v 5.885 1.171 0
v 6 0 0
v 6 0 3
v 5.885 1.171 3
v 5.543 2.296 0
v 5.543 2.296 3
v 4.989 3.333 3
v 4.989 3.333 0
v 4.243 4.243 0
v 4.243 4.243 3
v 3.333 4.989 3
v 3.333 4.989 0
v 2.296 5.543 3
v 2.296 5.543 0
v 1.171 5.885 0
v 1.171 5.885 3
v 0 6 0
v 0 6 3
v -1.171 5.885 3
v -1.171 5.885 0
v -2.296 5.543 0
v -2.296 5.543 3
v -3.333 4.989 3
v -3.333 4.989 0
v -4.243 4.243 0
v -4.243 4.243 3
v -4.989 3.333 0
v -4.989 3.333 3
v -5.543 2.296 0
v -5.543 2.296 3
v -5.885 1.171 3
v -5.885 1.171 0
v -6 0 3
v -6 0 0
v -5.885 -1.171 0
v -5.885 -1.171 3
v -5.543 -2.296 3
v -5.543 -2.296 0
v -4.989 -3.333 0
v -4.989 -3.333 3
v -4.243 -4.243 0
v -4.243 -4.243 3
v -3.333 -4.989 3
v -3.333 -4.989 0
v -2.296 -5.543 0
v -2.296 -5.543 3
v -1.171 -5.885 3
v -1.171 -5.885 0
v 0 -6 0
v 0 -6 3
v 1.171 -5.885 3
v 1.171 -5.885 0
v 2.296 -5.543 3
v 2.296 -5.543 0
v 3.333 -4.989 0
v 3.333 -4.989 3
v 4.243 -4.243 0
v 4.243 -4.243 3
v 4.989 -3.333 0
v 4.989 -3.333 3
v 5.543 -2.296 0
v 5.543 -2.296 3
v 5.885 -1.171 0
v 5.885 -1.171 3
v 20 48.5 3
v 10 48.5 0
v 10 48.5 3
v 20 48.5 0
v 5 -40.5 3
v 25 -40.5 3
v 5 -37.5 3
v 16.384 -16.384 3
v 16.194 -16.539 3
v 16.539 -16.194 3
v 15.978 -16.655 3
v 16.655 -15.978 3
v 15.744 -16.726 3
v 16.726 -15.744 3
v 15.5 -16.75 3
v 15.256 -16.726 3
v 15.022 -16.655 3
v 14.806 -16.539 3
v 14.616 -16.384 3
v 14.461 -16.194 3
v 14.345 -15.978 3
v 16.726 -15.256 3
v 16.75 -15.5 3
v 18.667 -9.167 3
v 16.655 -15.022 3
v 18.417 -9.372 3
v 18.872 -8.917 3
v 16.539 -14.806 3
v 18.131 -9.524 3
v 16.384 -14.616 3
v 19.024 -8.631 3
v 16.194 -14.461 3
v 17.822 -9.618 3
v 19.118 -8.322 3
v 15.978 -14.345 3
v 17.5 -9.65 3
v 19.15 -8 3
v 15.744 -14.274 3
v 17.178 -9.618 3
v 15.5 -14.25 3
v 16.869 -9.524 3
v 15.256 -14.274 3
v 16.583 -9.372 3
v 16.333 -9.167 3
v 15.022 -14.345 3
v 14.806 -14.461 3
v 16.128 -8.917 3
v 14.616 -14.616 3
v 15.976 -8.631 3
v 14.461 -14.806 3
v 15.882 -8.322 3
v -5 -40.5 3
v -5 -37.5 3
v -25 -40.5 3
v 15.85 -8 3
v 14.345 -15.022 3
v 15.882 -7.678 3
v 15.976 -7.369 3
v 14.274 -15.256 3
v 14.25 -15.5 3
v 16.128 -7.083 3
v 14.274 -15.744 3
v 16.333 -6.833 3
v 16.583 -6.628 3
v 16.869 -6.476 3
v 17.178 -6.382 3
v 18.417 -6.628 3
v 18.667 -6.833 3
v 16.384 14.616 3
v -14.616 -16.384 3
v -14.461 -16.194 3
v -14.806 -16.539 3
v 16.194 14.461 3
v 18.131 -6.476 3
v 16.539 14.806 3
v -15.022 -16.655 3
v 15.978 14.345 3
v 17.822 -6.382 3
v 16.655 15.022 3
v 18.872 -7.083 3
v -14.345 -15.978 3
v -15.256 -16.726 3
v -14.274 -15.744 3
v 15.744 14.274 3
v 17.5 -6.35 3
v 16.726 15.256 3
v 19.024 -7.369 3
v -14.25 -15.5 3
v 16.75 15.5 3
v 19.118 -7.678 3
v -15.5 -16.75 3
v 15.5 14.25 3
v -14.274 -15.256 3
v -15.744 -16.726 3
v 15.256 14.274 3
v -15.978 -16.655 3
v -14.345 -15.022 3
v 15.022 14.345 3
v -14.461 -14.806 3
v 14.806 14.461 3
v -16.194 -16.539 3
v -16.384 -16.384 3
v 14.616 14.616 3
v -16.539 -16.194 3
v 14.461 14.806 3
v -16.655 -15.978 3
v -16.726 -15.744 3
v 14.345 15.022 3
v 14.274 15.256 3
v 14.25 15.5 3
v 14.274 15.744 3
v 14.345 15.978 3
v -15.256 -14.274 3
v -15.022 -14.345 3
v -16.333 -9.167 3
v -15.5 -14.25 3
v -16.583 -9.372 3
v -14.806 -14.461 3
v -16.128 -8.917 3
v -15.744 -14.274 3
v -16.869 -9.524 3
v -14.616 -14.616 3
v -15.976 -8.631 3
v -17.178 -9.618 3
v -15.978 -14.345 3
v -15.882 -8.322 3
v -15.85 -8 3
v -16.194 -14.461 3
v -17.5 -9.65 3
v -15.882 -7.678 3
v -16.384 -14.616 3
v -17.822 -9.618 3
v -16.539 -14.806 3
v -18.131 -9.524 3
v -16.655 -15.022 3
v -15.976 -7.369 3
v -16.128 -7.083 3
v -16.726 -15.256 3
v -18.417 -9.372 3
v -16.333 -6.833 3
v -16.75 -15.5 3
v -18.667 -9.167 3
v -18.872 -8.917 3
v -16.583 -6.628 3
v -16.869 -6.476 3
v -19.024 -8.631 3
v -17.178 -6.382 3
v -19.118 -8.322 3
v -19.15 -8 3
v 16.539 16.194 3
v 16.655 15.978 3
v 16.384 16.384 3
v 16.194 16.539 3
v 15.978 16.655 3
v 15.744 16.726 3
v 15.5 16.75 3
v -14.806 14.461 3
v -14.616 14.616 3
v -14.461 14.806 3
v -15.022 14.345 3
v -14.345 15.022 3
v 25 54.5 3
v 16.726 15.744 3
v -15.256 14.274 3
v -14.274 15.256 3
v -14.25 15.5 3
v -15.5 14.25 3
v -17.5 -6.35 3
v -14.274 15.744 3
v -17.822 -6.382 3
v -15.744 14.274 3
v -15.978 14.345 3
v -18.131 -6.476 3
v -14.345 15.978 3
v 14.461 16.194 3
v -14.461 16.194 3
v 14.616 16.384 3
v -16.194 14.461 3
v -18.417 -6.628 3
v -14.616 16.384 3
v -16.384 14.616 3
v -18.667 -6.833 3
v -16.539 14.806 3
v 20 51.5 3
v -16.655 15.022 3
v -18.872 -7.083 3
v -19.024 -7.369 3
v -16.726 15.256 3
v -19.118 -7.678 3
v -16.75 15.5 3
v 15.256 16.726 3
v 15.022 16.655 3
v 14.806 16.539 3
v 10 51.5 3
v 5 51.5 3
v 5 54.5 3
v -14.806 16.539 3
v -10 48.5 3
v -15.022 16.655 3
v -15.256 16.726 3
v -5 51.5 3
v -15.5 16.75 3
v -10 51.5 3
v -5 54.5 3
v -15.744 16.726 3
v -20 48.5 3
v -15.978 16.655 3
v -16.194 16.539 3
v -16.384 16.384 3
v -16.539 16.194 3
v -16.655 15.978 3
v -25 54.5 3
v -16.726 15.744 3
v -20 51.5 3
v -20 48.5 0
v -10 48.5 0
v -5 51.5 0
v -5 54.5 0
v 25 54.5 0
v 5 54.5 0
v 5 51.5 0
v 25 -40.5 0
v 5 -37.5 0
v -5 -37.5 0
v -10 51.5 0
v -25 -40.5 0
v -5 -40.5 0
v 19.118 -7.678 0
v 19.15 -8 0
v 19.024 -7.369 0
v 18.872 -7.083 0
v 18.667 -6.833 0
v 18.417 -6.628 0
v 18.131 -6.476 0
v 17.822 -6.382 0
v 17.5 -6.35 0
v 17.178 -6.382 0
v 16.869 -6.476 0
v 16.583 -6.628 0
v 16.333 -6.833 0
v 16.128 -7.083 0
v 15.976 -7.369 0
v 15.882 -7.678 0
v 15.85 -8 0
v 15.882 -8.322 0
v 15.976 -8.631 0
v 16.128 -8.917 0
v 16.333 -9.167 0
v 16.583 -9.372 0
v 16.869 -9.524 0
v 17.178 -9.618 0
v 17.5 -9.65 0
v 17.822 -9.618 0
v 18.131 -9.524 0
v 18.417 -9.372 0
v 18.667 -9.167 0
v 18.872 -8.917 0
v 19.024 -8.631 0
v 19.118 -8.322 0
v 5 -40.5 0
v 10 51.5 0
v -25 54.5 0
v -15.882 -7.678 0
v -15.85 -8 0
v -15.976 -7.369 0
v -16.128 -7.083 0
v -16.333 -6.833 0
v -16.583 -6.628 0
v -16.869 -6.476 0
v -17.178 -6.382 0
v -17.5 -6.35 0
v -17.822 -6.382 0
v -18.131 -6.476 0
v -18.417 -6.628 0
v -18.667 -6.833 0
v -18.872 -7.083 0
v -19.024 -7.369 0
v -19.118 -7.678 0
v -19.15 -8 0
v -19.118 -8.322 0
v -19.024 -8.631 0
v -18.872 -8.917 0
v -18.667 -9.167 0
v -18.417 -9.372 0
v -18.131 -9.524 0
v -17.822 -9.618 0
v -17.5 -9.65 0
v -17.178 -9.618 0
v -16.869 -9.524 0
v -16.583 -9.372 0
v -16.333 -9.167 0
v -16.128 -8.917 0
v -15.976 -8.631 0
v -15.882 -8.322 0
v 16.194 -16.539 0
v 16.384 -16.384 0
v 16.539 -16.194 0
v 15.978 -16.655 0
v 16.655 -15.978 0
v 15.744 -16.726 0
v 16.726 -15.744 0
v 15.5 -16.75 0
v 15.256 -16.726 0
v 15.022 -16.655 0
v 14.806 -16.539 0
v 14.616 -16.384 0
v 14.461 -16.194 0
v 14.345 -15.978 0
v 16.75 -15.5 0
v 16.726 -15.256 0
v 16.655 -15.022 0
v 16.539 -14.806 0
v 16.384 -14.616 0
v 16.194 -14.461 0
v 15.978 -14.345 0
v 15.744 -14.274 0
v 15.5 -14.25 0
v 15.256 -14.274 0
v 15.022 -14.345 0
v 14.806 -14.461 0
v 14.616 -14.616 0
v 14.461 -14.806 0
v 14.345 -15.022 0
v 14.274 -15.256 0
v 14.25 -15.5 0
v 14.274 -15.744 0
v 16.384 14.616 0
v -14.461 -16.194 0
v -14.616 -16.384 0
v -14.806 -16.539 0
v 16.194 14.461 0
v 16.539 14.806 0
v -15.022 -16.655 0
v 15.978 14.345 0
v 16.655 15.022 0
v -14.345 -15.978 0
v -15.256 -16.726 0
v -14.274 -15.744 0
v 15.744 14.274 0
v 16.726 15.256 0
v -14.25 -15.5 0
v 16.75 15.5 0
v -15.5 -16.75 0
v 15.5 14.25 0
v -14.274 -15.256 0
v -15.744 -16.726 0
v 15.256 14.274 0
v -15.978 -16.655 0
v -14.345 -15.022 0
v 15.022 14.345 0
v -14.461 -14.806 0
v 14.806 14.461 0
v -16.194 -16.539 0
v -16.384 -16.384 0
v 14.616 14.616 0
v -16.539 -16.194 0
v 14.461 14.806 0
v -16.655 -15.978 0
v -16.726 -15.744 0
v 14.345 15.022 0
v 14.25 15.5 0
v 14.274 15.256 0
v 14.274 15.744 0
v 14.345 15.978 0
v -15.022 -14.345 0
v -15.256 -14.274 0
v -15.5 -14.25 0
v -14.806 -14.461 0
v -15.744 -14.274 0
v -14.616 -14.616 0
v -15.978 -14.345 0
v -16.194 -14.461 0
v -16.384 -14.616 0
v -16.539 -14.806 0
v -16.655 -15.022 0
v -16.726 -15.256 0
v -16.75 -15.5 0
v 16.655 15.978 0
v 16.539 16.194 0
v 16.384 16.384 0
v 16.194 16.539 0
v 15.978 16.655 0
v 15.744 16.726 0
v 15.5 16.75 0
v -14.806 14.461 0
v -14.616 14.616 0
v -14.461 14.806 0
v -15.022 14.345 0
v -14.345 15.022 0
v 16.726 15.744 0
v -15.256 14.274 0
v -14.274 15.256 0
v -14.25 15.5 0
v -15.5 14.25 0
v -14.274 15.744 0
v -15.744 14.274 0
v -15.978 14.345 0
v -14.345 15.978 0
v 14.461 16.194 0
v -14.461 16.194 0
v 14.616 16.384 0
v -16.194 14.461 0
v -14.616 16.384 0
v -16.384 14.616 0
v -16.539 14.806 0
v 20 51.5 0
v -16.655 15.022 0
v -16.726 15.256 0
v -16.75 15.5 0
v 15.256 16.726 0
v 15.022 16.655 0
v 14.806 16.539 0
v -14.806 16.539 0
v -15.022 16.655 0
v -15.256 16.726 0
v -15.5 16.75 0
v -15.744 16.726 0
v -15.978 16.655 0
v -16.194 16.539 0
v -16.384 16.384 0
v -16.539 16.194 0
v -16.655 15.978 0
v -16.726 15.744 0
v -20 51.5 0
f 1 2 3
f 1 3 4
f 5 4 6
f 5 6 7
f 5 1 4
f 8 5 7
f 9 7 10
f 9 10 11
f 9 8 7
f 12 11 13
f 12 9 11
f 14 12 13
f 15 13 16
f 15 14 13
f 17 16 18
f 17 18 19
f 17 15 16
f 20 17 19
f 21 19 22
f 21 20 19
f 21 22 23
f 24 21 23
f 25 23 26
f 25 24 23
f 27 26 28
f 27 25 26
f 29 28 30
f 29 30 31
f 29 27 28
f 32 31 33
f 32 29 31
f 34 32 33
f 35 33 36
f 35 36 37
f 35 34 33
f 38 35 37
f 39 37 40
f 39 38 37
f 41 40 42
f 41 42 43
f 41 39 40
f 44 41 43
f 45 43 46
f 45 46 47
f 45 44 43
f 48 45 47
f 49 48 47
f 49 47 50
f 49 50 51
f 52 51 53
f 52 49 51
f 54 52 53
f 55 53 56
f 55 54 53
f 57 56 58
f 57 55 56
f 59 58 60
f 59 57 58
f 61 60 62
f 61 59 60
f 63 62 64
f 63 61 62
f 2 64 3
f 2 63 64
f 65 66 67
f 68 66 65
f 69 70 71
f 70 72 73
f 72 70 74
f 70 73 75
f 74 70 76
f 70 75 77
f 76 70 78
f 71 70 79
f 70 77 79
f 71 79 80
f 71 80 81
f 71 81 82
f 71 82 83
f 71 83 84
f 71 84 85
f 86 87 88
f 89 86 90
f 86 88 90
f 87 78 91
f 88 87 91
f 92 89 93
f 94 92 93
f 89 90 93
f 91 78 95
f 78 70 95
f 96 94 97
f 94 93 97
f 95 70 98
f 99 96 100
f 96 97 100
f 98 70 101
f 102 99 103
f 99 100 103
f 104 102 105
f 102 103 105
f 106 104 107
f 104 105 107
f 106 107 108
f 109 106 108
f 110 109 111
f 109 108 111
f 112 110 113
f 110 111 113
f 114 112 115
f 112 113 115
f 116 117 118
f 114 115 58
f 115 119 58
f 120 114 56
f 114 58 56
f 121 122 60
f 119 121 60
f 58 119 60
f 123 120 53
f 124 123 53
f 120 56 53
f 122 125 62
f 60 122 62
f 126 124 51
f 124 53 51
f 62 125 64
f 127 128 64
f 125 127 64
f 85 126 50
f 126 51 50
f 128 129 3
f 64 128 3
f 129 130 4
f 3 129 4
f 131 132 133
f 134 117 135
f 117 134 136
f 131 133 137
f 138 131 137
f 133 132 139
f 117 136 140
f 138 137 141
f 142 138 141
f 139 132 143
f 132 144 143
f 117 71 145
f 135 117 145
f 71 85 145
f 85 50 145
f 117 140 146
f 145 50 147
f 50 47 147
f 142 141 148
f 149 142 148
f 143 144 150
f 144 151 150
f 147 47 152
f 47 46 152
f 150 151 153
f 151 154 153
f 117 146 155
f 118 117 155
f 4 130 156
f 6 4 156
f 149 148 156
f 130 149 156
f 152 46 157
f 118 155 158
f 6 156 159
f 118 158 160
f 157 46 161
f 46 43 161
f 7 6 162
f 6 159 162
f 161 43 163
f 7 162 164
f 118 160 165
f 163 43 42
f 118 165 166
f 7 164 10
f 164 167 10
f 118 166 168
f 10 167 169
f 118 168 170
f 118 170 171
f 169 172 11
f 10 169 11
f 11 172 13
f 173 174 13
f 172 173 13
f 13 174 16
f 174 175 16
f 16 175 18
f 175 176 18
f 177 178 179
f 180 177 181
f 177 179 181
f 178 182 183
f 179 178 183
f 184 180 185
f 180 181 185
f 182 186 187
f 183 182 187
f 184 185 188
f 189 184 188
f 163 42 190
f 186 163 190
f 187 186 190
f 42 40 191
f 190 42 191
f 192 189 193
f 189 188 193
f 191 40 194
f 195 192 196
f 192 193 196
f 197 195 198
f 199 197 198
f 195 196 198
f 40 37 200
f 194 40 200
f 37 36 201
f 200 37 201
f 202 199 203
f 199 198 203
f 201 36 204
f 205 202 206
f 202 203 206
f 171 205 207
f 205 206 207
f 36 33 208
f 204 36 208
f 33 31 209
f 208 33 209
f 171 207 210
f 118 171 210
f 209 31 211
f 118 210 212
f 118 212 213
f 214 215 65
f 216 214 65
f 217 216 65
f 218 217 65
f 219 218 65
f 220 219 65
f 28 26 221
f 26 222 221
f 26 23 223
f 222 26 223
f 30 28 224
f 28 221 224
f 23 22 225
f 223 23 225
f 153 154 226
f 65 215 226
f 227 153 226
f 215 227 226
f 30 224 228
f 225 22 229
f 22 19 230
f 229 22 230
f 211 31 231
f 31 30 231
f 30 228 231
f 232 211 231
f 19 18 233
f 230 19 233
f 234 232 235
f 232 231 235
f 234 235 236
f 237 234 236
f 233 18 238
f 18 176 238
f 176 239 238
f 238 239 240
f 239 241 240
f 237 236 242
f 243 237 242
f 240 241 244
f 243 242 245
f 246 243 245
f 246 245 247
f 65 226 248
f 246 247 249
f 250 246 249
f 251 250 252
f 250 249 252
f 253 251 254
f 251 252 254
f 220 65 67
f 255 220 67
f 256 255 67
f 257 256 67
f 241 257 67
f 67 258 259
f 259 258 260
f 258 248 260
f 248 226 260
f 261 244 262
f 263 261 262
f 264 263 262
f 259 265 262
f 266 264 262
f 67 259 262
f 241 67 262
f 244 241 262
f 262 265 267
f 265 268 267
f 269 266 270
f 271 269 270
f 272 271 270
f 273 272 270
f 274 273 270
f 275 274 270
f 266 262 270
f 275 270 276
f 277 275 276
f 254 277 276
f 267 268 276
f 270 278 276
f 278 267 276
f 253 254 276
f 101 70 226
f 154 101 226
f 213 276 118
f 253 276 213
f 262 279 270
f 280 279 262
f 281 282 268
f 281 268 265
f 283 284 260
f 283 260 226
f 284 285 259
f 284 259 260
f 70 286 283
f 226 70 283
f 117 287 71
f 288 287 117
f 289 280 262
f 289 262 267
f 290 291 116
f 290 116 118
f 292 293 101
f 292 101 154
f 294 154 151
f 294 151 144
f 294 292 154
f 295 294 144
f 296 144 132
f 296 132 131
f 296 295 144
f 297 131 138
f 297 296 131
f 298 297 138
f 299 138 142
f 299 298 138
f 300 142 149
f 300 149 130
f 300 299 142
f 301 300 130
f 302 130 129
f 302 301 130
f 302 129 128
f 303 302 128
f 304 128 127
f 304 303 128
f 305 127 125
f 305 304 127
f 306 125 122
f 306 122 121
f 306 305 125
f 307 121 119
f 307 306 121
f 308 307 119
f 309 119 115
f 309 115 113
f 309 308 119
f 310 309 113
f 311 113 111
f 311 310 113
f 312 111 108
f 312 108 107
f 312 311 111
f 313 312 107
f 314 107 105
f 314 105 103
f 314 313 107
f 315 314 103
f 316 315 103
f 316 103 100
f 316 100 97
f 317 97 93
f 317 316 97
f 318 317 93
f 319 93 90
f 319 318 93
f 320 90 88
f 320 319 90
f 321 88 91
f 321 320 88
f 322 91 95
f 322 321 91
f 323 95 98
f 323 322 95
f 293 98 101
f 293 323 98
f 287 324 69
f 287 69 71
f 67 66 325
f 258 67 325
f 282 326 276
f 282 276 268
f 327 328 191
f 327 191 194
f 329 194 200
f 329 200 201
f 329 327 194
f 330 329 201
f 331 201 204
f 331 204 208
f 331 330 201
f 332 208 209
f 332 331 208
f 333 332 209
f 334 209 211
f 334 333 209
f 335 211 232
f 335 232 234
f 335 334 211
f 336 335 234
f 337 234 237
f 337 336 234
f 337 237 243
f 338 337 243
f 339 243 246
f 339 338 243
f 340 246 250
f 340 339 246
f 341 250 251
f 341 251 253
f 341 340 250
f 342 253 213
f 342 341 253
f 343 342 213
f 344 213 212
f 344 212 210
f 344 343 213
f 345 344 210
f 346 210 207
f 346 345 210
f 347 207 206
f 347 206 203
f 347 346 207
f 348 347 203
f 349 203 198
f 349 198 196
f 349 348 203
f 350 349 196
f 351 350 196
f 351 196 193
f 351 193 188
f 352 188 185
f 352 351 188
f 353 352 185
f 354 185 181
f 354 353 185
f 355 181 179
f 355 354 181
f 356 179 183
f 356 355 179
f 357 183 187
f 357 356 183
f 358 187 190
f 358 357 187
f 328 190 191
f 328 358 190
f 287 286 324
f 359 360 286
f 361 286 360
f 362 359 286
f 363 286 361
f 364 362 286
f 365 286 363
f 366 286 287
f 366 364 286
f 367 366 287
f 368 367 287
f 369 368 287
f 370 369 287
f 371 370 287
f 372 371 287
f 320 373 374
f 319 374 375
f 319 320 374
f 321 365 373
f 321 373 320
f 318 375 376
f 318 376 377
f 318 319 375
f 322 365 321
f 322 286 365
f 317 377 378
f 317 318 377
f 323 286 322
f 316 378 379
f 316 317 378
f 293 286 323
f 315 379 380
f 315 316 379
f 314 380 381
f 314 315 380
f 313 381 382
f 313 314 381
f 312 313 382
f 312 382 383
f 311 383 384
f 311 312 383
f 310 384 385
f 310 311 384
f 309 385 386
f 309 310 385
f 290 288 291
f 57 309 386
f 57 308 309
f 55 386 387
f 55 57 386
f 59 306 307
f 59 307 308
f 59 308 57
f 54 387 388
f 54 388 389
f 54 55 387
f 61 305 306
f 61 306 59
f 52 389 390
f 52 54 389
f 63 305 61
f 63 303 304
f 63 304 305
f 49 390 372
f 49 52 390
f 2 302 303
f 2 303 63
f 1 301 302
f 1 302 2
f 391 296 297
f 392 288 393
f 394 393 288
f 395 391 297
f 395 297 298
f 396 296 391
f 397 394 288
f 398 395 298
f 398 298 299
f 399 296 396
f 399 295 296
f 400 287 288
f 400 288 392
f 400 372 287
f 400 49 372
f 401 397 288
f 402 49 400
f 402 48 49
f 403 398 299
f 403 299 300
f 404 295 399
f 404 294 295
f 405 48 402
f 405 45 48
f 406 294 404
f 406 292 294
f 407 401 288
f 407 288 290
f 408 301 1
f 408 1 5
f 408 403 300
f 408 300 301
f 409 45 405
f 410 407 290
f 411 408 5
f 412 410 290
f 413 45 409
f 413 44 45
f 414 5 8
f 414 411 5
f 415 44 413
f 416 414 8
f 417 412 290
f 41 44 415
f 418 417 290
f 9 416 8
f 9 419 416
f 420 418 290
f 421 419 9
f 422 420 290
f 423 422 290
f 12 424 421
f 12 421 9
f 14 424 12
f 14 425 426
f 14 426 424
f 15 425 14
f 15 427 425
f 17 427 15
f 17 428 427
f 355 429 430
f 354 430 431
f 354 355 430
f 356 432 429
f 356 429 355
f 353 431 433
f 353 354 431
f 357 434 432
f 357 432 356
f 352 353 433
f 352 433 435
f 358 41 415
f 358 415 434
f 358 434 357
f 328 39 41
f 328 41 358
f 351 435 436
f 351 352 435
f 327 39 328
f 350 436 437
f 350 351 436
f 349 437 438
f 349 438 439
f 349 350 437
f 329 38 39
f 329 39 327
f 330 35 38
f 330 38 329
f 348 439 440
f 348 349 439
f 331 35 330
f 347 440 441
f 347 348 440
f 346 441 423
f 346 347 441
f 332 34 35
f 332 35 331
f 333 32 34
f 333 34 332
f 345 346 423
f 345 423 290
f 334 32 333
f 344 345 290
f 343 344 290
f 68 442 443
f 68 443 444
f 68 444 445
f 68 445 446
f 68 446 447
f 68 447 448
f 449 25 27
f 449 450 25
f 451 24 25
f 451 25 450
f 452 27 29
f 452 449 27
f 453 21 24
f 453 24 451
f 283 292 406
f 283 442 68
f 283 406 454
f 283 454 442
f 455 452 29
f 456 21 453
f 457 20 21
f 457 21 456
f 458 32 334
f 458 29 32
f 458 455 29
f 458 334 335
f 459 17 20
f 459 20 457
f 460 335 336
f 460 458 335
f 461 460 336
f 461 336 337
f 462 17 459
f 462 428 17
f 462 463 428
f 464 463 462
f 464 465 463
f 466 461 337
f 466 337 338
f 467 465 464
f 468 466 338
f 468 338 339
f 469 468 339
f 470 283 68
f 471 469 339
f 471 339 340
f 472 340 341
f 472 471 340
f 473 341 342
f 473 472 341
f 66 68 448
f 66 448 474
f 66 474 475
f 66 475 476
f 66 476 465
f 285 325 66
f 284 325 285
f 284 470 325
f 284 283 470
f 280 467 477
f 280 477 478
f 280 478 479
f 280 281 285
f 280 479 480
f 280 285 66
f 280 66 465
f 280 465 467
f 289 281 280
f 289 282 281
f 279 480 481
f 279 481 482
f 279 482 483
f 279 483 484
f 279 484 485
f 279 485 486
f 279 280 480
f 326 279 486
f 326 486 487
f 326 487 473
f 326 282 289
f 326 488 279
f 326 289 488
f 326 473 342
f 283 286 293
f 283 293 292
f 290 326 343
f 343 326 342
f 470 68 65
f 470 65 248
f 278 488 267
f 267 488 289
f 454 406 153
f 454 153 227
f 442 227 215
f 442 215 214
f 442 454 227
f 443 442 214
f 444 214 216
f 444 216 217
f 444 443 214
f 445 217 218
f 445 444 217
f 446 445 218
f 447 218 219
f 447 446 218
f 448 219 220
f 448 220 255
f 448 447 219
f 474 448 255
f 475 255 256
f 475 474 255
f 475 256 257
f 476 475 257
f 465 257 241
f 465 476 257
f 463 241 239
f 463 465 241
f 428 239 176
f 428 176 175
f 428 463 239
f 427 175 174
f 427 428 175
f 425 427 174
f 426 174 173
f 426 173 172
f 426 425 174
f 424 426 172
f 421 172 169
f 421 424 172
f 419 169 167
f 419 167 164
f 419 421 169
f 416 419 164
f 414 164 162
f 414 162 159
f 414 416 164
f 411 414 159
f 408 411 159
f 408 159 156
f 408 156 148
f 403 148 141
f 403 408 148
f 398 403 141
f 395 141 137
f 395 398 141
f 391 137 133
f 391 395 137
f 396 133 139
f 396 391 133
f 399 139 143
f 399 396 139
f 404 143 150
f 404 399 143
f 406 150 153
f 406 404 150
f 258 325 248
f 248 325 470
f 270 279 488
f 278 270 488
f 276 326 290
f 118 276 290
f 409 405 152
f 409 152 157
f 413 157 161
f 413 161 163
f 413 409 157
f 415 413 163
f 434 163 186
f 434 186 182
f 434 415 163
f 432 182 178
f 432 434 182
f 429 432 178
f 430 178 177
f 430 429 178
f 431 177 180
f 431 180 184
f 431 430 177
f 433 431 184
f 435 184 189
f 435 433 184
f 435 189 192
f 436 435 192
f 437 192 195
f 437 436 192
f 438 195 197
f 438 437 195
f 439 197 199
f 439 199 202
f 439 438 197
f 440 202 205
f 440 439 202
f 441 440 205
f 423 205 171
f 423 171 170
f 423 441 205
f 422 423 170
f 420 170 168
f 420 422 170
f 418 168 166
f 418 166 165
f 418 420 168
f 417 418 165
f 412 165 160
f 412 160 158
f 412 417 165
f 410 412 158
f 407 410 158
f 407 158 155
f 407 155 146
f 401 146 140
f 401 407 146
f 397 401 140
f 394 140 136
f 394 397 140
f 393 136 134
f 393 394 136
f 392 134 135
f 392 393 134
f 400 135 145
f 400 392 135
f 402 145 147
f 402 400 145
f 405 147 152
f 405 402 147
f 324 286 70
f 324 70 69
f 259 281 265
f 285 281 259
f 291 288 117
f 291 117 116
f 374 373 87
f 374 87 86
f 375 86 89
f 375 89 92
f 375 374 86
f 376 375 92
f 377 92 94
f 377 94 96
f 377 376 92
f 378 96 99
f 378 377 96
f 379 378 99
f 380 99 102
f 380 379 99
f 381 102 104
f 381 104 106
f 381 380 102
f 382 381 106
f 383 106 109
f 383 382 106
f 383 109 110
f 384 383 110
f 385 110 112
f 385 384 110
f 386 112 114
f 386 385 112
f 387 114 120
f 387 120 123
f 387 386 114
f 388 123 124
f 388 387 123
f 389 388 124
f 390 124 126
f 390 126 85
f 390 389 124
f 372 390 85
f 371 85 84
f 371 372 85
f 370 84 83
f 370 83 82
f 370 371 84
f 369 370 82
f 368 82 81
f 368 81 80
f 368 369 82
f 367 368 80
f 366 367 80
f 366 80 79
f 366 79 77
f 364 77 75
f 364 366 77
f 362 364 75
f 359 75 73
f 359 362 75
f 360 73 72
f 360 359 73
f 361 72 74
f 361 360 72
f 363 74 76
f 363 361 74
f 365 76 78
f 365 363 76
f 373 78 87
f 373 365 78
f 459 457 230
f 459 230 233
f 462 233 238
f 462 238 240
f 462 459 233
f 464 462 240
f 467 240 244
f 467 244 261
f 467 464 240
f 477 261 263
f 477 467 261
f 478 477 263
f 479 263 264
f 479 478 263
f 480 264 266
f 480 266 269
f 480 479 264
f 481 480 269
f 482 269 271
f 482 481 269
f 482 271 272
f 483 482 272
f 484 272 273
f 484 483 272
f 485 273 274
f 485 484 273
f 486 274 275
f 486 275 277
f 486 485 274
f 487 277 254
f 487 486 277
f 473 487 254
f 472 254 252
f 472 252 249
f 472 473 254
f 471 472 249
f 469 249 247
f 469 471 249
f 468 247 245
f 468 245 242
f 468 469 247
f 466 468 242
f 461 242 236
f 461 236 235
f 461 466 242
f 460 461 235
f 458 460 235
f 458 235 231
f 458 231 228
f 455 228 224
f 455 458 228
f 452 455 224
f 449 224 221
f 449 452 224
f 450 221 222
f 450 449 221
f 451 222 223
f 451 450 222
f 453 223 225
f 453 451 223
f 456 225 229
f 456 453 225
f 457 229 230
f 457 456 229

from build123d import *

# Parameters (mm, degrees)
SKETCH1_R           = 6
SKETCH1_R_2         = 1.25
SKETCH1_R_3         = 1.65
SKETCH1_W           = 10
SKETCH1_H           = 3
BOSS_EXTRUDE2_DEPTH = 3


with BuildPart() as part:
    # Sketch1 → Boss-Extrude2 (new body)
    with BuildSketch(Plane.XY):
        Polygon((25, 5), (25, -5.5), (25, -40.5), (5, -40.5), (5, -37.5), (-5, -37.5), (-5, -40.5), (-25, -40.5), (-25, -5.5), (-25, 4.5), (-25, 24.5), (-25, 54.5), (-5, 54.5), (-5, 51.5), (5, 51.5), (5, 54.5), (25, 54.5), (25, 24.5), align=None)
        Circle(SKETCH1_R, mode=Mode.SUBTRACT)
        with Locations((-15.5, 15.5)):
            Circle(SKETCH1_R_2, mode=Mode.SUBTRACT)
        with Locations((15.5, 15.5)):
            Circle(SKETCH1_R_2, mode=Mode.SUBTRACT)
        with Locations((15.5, -15.5)):
            Circle(SKETCH1_R_2, mode=Mode.SUBTRACT)
        with Locations((-15.5, -15.5)):
            Circle(SKETCH1_R_2, mode=Mode.SUBTRACT)
        with Locations((-17.5, -8)):
            Circle(SKETCH1_R_3, mode=Mode.SUBTRACT)
        with Locations((17.5, -8)):
            Circle(SKETCH1_R_3, mode=Mode.SUBTRACT)
        with Locations((-15, 50)):
            Rectangle(SKETCH1_W, SKETCH1_H, mode=Mode.SUBTRACT)
        with Locations((15, 50)):
            Rectangle(SKETCH1_W, SKETCH1_H, mode=Mode.SUBTRACT)
    extrude(amount=BOSS_EXTRUDE2_DEPTH)


solid = part.part
